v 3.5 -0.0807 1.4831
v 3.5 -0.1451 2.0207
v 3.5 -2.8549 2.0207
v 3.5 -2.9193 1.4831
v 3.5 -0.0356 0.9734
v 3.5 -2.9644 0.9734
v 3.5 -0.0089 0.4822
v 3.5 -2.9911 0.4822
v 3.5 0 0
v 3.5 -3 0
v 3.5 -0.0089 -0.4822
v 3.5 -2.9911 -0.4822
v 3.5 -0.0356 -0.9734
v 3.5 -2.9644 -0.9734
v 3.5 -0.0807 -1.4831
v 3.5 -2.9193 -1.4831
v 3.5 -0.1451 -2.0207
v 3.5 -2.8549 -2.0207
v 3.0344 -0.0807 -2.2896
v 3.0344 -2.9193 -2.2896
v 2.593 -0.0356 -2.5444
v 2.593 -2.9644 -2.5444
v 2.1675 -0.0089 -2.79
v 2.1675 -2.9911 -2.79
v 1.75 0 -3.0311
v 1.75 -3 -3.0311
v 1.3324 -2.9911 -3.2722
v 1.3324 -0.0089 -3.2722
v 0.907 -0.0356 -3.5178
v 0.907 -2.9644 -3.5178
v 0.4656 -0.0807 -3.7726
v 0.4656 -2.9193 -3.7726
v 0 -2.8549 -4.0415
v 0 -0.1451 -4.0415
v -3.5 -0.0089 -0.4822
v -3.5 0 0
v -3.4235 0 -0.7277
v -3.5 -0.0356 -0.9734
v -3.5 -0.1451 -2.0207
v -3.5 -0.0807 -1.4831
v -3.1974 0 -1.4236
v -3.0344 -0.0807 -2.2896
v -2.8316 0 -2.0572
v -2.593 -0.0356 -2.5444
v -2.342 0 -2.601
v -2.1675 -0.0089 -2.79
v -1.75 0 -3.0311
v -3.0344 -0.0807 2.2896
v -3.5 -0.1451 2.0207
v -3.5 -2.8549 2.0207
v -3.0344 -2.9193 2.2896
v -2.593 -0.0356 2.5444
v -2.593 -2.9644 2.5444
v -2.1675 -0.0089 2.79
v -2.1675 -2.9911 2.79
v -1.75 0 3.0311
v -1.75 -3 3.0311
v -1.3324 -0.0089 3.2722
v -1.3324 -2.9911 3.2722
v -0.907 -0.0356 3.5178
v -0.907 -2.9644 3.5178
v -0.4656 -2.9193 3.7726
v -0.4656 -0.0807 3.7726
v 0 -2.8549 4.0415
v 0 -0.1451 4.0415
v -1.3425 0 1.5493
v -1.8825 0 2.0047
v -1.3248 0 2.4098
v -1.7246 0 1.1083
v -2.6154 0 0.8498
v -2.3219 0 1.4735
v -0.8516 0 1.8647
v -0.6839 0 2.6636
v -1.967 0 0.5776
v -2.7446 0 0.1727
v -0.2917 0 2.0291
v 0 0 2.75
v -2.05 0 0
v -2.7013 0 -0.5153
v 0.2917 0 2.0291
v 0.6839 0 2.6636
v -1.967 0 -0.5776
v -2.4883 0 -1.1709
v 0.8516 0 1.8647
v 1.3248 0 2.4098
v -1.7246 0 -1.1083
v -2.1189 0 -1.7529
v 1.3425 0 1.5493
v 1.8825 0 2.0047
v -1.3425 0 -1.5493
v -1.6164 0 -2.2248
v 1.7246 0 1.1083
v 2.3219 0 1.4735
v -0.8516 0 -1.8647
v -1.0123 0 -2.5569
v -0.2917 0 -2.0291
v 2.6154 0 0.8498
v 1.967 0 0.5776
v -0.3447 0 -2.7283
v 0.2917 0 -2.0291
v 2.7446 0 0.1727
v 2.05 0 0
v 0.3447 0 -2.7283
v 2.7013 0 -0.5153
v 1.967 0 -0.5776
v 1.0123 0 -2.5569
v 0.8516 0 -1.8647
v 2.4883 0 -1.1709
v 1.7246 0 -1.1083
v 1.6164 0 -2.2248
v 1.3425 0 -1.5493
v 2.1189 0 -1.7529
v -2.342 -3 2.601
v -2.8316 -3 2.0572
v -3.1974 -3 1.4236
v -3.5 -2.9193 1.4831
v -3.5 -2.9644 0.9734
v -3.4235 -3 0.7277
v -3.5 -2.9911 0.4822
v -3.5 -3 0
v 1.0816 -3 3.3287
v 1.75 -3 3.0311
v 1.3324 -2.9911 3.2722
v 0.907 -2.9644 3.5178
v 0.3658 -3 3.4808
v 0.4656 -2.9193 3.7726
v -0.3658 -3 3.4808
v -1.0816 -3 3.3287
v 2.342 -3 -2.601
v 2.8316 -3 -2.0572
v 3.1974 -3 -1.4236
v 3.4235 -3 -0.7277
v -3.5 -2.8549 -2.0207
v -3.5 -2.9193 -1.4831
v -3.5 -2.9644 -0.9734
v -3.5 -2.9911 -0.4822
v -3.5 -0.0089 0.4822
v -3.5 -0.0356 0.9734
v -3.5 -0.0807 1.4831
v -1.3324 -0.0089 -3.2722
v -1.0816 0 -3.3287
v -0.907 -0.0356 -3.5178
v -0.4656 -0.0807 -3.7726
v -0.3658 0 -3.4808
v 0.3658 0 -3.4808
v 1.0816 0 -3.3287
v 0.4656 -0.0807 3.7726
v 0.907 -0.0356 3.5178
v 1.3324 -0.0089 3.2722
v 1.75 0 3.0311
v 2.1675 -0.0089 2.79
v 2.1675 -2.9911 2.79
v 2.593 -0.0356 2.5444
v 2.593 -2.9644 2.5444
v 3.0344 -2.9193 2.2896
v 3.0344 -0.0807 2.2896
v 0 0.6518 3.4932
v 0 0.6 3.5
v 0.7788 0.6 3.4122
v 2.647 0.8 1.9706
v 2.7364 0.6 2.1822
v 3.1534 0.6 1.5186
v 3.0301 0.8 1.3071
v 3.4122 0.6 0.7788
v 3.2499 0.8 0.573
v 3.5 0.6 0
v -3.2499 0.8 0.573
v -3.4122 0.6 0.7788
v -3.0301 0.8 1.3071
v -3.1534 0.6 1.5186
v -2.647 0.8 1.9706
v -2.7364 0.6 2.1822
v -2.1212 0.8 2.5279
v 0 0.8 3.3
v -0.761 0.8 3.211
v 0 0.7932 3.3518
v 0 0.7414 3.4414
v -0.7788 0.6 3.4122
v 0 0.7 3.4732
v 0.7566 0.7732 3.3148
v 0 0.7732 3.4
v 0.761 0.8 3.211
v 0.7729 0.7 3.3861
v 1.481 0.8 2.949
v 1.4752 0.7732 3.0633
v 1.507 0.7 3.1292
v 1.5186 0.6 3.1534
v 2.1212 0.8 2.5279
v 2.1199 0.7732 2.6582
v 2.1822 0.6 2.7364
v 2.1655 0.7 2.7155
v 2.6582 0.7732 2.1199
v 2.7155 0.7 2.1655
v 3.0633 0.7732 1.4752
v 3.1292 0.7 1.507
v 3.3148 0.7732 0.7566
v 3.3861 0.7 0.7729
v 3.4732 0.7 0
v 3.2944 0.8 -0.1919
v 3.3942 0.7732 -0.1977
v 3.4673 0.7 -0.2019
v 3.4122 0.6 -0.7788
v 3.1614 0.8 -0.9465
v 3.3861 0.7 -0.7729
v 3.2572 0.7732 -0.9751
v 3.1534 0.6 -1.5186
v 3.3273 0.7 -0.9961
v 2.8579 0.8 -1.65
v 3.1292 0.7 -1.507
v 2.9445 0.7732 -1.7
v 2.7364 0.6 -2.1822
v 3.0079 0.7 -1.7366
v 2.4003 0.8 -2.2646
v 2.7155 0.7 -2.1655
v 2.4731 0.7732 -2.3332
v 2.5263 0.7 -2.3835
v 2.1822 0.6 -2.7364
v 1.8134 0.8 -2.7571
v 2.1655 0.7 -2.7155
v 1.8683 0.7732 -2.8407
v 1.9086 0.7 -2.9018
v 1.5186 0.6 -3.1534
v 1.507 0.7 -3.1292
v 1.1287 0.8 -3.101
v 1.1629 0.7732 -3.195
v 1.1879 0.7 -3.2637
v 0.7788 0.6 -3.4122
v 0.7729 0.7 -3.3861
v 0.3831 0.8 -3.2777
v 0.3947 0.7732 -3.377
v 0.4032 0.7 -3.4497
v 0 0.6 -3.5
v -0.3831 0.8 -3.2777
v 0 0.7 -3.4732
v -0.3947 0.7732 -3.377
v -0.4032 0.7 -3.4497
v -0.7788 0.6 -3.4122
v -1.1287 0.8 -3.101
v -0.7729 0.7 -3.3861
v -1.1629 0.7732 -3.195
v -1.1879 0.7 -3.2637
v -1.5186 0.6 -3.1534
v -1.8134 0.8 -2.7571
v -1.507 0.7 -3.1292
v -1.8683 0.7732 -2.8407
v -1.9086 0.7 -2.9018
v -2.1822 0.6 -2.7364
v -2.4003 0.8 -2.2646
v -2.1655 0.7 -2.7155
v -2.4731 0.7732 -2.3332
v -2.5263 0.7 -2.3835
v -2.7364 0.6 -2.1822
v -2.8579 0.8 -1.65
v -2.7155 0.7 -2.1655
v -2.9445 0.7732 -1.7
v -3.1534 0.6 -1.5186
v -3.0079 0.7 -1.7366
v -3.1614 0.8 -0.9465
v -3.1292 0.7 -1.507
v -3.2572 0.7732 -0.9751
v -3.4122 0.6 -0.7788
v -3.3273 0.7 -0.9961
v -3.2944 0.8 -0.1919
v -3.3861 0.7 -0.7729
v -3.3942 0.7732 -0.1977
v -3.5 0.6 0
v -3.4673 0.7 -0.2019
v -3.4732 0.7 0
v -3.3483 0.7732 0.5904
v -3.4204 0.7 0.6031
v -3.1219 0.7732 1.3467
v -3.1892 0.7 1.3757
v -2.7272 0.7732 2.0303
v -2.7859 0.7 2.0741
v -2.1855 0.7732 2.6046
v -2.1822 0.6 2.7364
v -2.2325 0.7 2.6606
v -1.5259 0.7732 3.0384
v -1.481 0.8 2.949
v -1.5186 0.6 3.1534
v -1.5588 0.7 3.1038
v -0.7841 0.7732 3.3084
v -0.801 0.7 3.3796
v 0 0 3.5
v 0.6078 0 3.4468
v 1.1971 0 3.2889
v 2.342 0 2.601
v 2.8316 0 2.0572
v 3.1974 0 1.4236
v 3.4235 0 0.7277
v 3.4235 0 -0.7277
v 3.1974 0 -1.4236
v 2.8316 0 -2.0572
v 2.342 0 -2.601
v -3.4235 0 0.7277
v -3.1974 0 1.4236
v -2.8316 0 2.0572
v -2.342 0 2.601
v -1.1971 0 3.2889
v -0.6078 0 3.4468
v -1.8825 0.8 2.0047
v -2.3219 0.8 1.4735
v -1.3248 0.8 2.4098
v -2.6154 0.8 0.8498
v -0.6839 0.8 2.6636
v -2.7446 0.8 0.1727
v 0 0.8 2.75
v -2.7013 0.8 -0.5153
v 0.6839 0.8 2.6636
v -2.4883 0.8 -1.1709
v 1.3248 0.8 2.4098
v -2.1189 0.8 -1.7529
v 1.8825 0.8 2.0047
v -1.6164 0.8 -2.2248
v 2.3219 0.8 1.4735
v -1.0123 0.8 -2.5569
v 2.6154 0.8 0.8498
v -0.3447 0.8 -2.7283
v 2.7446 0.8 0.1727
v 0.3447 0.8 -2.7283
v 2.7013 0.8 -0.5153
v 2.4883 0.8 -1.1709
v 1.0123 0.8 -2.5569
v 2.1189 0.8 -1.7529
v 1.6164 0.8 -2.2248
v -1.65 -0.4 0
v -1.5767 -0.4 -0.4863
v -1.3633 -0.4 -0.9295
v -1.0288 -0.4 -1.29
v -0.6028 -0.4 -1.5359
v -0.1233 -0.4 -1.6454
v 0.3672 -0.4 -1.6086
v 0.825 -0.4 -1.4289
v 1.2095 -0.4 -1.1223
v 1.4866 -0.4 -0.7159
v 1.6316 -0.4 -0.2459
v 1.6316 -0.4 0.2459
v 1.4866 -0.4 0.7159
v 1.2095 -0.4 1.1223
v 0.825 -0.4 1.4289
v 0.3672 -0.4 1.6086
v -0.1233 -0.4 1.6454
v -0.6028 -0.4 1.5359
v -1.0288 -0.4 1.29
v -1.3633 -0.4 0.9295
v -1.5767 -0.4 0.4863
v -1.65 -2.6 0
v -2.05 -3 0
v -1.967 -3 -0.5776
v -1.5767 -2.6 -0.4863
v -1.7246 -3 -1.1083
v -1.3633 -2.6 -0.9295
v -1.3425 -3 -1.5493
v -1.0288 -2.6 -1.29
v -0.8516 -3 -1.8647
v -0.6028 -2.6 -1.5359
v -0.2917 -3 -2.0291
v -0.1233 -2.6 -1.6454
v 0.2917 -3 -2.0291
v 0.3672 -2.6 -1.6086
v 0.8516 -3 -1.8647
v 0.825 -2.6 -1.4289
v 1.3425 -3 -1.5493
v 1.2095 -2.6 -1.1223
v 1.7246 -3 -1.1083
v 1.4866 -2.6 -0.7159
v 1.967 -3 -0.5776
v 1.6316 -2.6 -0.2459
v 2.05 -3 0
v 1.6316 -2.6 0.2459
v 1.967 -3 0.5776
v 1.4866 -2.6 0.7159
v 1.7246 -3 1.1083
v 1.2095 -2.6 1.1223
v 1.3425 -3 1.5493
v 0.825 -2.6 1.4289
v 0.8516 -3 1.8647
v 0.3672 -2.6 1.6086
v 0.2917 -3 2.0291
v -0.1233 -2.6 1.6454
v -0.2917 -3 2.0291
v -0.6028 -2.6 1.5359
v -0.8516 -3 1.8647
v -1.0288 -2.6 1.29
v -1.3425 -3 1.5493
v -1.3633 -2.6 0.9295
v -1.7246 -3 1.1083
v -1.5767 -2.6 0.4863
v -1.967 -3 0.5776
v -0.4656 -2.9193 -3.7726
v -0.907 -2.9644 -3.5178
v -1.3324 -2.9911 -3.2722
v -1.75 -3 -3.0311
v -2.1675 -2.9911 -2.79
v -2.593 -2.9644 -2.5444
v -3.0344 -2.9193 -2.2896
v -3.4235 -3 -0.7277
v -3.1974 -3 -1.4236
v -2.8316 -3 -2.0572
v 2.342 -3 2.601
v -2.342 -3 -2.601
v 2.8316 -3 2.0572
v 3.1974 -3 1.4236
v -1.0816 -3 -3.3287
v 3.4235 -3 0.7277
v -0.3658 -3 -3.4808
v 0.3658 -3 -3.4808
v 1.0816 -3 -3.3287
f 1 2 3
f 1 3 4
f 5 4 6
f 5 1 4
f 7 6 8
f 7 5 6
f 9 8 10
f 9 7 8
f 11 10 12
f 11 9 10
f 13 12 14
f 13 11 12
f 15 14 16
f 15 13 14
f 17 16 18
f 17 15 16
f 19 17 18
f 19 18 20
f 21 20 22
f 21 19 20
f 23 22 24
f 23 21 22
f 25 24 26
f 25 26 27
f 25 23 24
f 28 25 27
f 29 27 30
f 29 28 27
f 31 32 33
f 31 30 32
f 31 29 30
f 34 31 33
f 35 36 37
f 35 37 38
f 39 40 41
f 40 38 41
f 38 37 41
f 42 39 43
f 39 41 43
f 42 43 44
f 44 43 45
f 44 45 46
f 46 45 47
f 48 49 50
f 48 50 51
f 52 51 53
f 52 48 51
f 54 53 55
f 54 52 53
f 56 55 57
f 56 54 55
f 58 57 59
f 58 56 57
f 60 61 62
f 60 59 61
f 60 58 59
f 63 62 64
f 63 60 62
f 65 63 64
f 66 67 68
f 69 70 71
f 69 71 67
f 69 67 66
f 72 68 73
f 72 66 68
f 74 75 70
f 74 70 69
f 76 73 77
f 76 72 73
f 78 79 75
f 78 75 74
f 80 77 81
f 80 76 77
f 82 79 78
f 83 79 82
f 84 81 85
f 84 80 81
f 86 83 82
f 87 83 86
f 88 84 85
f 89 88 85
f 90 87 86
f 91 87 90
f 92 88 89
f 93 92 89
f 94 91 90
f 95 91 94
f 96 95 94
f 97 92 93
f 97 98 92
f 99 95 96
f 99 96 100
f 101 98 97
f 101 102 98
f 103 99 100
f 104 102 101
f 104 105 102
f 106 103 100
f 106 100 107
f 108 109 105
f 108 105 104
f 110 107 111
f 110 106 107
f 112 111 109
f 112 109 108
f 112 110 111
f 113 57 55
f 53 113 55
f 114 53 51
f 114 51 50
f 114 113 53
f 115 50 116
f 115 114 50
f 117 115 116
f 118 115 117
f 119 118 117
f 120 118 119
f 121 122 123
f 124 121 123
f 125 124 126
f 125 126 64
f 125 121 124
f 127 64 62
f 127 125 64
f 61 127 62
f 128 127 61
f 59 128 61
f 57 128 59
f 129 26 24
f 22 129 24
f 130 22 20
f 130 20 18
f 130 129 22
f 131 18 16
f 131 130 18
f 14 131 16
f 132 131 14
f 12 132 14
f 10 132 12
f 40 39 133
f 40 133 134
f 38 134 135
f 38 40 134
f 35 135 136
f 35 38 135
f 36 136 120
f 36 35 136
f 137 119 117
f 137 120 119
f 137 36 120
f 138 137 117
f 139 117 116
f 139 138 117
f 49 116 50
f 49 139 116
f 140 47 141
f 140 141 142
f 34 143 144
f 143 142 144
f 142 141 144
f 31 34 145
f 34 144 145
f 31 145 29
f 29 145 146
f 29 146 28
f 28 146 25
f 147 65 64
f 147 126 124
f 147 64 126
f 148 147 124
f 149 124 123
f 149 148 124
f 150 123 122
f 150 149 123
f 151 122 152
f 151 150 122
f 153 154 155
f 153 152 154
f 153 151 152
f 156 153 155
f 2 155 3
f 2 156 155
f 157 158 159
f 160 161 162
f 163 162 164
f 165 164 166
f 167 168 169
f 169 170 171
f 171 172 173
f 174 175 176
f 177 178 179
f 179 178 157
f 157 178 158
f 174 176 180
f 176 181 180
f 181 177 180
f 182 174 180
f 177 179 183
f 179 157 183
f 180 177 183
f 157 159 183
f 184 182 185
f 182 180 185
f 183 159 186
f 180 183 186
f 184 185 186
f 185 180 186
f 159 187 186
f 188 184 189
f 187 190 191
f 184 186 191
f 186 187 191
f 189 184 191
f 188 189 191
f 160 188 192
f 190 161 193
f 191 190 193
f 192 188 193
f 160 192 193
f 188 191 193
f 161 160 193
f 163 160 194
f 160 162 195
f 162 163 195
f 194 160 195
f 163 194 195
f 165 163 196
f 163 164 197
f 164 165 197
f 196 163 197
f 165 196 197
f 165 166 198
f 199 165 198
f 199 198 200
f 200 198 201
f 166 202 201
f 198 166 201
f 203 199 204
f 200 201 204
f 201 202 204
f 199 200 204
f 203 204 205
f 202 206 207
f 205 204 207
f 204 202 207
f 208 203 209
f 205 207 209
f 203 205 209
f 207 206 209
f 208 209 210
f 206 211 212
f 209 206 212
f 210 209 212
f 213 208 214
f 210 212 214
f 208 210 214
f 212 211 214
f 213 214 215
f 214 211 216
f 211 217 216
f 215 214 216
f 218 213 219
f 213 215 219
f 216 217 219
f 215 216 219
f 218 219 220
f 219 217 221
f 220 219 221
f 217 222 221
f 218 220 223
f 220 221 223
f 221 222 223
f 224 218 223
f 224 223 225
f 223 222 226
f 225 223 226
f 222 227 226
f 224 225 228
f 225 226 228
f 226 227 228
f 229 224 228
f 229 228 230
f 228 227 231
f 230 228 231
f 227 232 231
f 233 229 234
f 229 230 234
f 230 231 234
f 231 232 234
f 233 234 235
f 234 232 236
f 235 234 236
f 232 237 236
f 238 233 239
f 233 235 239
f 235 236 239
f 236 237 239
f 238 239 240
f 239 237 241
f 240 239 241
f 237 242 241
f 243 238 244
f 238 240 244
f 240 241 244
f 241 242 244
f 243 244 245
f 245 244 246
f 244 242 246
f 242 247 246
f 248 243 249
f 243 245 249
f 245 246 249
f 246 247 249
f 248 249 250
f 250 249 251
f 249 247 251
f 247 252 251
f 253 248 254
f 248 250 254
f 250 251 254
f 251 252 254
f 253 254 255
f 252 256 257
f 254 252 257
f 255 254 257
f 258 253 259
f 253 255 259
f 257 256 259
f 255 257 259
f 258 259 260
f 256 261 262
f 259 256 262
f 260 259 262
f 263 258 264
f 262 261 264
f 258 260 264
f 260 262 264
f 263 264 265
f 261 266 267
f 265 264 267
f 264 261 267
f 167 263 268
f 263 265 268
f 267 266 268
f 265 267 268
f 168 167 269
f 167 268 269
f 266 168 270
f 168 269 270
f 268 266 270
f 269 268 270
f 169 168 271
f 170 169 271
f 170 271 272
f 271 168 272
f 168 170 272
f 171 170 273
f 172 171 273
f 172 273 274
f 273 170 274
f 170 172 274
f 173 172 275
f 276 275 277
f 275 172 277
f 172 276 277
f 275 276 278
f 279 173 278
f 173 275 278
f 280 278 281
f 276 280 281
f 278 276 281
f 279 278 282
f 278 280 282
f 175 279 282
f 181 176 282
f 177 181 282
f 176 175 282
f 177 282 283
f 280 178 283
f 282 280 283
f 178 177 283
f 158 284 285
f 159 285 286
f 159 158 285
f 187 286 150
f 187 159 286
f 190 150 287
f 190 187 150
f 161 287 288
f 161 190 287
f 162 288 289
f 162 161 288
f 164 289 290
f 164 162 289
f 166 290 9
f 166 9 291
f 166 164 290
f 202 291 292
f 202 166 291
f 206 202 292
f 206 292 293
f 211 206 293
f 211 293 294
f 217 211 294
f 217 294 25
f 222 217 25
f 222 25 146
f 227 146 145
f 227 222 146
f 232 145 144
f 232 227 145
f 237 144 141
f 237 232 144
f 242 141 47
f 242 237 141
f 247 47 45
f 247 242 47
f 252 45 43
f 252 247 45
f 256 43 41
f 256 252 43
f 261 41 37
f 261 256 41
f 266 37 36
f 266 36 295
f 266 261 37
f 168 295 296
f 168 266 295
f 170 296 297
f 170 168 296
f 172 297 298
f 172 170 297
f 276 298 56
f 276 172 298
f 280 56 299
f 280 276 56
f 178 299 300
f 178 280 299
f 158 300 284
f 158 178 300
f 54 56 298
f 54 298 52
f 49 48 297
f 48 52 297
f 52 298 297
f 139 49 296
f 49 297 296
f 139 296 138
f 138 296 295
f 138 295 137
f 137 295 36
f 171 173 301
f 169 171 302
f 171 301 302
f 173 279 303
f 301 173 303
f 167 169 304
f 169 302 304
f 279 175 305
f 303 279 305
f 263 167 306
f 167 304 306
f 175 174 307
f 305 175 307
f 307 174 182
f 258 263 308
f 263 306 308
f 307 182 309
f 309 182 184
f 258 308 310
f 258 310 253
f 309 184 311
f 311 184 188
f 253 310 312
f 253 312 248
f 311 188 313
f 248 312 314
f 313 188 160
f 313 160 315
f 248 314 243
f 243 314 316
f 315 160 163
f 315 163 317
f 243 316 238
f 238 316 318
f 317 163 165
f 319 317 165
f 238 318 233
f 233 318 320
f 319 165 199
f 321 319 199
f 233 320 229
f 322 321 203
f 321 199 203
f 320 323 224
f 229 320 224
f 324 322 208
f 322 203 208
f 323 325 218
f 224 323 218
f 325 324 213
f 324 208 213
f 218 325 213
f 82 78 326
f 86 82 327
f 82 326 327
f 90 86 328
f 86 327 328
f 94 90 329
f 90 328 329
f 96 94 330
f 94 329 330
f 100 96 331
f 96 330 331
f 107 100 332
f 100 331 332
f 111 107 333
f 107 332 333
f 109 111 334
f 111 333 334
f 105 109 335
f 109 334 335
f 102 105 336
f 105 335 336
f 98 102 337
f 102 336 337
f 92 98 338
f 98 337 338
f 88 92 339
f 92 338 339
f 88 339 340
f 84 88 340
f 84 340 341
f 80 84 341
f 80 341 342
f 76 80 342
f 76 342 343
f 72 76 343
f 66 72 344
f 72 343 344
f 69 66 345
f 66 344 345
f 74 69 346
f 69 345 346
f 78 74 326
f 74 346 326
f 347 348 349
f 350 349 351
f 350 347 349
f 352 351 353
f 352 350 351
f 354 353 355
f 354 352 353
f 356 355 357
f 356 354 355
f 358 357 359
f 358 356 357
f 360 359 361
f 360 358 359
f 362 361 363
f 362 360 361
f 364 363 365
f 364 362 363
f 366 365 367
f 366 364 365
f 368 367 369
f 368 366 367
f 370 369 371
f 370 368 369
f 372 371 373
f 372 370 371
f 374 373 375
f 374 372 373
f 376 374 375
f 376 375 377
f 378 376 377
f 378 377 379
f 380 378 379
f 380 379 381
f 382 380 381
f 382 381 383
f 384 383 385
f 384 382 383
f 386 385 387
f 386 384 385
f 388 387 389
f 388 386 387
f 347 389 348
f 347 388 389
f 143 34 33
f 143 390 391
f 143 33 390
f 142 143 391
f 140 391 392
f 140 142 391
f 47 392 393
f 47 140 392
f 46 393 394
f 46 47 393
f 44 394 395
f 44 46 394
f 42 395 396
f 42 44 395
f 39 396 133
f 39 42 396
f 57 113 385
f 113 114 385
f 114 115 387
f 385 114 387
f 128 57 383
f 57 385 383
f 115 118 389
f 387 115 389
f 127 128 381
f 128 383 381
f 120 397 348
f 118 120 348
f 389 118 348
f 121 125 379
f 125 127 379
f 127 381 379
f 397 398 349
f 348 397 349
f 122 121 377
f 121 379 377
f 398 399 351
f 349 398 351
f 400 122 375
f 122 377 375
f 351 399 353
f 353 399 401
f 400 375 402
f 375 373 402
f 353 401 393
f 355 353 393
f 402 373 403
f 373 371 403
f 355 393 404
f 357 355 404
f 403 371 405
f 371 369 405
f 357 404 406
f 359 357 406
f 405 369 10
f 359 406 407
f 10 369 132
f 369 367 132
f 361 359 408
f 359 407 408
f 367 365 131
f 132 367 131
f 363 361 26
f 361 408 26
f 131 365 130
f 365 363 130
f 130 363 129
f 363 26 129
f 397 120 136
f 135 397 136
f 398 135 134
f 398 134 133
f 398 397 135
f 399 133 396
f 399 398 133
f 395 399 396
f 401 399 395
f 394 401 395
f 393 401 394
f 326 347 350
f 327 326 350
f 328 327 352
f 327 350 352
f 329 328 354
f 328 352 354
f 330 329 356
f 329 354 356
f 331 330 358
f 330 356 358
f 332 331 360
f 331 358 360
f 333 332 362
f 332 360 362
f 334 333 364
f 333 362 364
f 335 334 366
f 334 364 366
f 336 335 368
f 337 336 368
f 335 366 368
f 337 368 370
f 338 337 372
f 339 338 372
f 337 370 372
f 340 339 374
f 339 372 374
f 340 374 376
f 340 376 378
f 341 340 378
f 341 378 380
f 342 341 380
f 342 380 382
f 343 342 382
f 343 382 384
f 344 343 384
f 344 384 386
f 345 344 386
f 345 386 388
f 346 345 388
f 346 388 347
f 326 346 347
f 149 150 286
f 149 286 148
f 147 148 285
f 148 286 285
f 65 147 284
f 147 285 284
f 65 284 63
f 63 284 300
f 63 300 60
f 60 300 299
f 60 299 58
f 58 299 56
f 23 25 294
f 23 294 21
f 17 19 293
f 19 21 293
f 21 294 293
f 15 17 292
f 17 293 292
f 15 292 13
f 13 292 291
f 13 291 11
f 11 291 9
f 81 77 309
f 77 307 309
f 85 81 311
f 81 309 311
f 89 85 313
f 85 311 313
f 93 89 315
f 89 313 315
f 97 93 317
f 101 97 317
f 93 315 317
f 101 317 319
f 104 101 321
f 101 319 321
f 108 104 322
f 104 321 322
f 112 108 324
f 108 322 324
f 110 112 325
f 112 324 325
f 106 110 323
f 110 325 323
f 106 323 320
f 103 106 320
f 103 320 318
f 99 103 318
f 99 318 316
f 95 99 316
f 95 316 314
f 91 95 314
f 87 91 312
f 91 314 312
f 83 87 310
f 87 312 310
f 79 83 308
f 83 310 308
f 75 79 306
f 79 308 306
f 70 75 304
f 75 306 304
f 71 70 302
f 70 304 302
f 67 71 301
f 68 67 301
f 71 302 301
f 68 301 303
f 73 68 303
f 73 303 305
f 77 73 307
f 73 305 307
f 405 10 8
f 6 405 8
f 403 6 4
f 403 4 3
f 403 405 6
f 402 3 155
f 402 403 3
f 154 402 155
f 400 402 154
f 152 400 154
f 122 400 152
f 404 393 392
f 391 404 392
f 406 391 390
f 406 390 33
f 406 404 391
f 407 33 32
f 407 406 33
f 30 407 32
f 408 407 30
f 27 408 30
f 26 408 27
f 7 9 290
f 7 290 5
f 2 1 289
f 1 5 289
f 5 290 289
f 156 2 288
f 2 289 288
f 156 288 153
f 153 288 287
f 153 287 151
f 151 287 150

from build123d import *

# Parameters (mm, degrees)
BOSS_EXTRUDE1_DEPTH = 3
TAPPED_HOLE1_D      = 3.3
CHAMFER1_SIZE       = 0.4
SKETCH5_W           = 0.75
SKETCH5_H           = 0.8
FILLET1_R           = 0.2


with BuildPart() as part:
    # Sketch1 → Boss-Extrude1 (new body)
    with BuildSketch(Plane(origin=(0, 0, 0), x_dir=(1, 0, 0), z_dir=(0, 1, 0))):
        Polygon((0, 4.041451884), (-3.5, 2.020725942), (-3.5, -2.020725942), (0, -4.041451884), (3.5, -2.020725942), (3.5, 2.020725942), align=None)
    extrude(amount=-BOSS_EXTRUDE1_DEPTH)

    # Sketch2 → Cut-Revolve1 (revolve, cut)
    with BuildSketch(Plane(origin=(0, 0, 0), x_dir=(0, 0, -1), z_dir=(1, 0, 0))):
        Polygon((3.5, 0), (4.041451884, 0), (4.041451884, -0.145081595), align=None)
        Polygon((4.041451884, -2.854918405), (3.5, -3), (4.041451884, -3), align=None)
    revolve(axis=Axis((0, 0, 0), (0, -1, 0)), mode=Mode.SUBTRACT)

    # Tapped Hole1 (through all)
    with Locations(Plane(origin=(0, 0, 0), x_dir=(1, 0, 0), z_dir=(0, 1, 0))):
        with Locations((0, 0)):
            Hole(TAPPED_HOLE1_D / 2)

    # Chamfer1
    chamfer1_edges = [part.edges().sort_by_distance(p)[0] for p in [
        (1.65, 0, 0),
        (1.65, -3, 0),
    ]]
    chamfer(chamfer1_edges, length=CHAMFER1_SIZE)

    # Sketch5 → Revolve1 (revolve)
    with BuildSketch(Plane.XY, mode=Mode.PRIVATE) as revolve1_sk:
        with Locations((3.125, 0.4)):
            Rectangle(SKETCH5_W, SKETCH5_H)
    revolve(revolve1_sk.sketch.rotate(Axis((0, 0, 0), (0, 1, 0)), 270), axis=Axis((0, 0, 0), (0, 1, 0)))

    # Fillet1
    fillet1_edges = [part.edges().sort_by_distance(p)[0] for p in [
        (0, 0.8, -3.5),
    ]]
    fillet(fillet1_edges, radius=FILLET1_R)


solid = part.part
